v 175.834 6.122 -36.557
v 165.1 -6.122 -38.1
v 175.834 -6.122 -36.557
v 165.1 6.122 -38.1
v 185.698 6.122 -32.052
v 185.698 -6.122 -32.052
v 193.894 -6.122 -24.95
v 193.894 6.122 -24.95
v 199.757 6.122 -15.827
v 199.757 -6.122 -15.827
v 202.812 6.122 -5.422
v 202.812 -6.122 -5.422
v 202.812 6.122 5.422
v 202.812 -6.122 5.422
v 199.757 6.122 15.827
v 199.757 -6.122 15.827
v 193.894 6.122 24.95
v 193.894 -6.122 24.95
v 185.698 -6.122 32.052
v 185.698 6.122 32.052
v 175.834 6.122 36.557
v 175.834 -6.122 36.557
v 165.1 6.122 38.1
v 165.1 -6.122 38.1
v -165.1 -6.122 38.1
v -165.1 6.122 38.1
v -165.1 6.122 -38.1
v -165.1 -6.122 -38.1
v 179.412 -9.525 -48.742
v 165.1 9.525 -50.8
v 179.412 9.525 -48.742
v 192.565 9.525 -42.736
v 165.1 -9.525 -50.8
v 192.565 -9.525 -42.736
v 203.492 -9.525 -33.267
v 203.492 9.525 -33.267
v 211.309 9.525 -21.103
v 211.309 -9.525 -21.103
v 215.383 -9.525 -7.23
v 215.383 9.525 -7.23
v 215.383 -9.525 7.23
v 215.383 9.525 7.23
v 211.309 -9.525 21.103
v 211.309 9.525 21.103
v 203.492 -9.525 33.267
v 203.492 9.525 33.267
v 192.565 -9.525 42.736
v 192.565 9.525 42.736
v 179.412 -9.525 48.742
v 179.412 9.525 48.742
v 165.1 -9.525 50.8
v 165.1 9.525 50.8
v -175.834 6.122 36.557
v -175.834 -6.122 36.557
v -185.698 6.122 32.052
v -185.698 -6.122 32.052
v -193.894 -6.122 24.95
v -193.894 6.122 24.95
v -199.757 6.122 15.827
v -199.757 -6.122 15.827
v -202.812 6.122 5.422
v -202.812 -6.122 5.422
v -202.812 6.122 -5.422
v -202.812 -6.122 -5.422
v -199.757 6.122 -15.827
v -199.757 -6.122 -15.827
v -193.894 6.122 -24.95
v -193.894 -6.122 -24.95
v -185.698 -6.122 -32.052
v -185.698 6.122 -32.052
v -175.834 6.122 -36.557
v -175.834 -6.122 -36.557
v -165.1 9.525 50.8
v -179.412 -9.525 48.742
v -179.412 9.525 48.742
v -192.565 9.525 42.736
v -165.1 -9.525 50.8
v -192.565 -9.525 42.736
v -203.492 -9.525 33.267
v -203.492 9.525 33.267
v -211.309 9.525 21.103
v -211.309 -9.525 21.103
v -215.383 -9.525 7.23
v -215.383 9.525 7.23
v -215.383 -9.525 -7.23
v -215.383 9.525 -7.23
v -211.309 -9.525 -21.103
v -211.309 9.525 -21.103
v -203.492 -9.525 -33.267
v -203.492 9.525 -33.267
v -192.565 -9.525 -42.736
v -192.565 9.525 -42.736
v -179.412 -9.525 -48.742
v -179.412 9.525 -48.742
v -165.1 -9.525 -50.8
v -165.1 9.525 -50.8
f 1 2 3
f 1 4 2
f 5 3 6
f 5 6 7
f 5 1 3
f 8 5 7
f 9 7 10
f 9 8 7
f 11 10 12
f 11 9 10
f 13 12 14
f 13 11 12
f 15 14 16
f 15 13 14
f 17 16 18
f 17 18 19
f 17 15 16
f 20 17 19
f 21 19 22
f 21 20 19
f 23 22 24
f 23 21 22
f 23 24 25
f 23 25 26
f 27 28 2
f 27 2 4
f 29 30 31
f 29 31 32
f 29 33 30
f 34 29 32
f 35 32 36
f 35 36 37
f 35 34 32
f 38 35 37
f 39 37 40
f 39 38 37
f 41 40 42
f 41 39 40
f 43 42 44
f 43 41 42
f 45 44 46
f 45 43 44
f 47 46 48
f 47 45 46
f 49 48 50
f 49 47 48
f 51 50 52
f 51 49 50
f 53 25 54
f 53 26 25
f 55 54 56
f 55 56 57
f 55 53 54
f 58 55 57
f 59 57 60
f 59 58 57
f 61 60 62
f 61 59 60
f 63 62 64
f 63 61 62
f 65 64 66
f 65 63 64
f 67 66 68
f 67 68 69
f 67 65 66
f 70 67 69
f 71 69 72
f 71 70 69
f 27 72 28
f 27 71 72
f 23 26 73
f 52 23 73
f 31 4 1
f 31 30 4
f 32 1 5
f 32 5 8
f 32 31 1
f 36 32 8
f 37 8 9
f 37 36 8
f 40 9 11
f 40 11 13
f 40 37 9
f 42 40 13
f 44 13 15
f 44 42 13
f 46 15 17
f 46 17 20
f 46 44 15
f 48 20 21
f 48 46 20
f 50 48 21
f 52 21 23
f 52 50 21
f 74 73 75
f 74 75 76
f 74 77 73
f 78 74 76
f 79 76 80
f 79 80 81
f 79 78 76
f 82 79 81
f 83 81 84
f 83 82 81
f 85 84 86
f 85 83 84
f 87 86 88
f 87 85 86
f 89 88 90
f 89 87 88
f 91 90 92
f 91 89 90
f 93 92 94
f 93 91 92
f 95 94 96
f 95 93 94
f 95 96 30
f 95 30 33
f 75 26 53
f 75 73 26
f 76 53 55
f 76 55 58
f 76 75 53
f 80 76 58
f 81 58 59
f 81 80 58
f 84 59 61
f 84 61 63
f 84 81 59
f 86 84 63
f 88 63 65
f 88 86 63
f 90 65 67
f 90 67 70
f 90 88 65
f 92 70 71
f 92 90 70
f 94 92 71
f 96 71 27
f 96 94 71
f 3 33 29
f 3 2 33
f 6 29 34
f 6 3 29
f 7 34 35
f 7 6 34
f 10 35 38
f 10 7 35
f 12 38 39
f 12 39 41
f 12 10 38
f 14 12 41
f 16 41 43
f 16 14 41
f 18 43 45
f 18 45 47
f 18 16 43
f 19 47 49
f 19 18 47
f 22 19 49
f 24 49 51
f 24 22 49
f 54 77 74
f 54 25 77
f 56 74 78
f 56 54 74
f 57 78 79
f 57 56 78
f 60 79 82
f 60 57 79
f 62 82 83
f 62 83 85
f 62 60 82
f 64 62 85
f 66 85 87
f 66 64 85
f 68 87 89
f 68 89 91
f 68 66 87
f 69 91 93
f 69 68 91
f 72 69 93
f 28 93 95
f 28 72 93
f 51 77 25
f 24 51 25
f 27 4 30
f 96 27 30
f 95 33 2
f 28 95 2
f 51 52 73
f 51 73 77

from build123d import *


with BuildPart() as part:
    # Sweep1: sweep along a path in Sketch1
    with BuildLine(Plane(origin=(0, 0, 0), x_dir=(1, 0, 0), z_dir=(0, 1, 0))) as sweep1_path:
        Line((165.1, -50.8), (-165.1, -50.8))
        ThreePointArc((-165.1, -50.8), (-215.9, 0), (-165.1, 50.8))
        Line((-165.1, 50.8), (165.1, 50.8))
        ThreePointArc((165.1, 50.8), (215.9, 0), (165.1, -50.8))
    # Sketch2 → Sweep1 (sweep)
    with BuildSketch(Plane(origin=(-165.1, 0, -50.8), x_dir=(0, 0, 1), z_dir=(-1, 0, 0))):
        Polygon((0, 0), (0, 9.525), (12.7, 6.122045256), (12.7, -6.122045256), (0, -9.525), align=None)
    sweep(path=sweep1_path.line)


solid = part.part
